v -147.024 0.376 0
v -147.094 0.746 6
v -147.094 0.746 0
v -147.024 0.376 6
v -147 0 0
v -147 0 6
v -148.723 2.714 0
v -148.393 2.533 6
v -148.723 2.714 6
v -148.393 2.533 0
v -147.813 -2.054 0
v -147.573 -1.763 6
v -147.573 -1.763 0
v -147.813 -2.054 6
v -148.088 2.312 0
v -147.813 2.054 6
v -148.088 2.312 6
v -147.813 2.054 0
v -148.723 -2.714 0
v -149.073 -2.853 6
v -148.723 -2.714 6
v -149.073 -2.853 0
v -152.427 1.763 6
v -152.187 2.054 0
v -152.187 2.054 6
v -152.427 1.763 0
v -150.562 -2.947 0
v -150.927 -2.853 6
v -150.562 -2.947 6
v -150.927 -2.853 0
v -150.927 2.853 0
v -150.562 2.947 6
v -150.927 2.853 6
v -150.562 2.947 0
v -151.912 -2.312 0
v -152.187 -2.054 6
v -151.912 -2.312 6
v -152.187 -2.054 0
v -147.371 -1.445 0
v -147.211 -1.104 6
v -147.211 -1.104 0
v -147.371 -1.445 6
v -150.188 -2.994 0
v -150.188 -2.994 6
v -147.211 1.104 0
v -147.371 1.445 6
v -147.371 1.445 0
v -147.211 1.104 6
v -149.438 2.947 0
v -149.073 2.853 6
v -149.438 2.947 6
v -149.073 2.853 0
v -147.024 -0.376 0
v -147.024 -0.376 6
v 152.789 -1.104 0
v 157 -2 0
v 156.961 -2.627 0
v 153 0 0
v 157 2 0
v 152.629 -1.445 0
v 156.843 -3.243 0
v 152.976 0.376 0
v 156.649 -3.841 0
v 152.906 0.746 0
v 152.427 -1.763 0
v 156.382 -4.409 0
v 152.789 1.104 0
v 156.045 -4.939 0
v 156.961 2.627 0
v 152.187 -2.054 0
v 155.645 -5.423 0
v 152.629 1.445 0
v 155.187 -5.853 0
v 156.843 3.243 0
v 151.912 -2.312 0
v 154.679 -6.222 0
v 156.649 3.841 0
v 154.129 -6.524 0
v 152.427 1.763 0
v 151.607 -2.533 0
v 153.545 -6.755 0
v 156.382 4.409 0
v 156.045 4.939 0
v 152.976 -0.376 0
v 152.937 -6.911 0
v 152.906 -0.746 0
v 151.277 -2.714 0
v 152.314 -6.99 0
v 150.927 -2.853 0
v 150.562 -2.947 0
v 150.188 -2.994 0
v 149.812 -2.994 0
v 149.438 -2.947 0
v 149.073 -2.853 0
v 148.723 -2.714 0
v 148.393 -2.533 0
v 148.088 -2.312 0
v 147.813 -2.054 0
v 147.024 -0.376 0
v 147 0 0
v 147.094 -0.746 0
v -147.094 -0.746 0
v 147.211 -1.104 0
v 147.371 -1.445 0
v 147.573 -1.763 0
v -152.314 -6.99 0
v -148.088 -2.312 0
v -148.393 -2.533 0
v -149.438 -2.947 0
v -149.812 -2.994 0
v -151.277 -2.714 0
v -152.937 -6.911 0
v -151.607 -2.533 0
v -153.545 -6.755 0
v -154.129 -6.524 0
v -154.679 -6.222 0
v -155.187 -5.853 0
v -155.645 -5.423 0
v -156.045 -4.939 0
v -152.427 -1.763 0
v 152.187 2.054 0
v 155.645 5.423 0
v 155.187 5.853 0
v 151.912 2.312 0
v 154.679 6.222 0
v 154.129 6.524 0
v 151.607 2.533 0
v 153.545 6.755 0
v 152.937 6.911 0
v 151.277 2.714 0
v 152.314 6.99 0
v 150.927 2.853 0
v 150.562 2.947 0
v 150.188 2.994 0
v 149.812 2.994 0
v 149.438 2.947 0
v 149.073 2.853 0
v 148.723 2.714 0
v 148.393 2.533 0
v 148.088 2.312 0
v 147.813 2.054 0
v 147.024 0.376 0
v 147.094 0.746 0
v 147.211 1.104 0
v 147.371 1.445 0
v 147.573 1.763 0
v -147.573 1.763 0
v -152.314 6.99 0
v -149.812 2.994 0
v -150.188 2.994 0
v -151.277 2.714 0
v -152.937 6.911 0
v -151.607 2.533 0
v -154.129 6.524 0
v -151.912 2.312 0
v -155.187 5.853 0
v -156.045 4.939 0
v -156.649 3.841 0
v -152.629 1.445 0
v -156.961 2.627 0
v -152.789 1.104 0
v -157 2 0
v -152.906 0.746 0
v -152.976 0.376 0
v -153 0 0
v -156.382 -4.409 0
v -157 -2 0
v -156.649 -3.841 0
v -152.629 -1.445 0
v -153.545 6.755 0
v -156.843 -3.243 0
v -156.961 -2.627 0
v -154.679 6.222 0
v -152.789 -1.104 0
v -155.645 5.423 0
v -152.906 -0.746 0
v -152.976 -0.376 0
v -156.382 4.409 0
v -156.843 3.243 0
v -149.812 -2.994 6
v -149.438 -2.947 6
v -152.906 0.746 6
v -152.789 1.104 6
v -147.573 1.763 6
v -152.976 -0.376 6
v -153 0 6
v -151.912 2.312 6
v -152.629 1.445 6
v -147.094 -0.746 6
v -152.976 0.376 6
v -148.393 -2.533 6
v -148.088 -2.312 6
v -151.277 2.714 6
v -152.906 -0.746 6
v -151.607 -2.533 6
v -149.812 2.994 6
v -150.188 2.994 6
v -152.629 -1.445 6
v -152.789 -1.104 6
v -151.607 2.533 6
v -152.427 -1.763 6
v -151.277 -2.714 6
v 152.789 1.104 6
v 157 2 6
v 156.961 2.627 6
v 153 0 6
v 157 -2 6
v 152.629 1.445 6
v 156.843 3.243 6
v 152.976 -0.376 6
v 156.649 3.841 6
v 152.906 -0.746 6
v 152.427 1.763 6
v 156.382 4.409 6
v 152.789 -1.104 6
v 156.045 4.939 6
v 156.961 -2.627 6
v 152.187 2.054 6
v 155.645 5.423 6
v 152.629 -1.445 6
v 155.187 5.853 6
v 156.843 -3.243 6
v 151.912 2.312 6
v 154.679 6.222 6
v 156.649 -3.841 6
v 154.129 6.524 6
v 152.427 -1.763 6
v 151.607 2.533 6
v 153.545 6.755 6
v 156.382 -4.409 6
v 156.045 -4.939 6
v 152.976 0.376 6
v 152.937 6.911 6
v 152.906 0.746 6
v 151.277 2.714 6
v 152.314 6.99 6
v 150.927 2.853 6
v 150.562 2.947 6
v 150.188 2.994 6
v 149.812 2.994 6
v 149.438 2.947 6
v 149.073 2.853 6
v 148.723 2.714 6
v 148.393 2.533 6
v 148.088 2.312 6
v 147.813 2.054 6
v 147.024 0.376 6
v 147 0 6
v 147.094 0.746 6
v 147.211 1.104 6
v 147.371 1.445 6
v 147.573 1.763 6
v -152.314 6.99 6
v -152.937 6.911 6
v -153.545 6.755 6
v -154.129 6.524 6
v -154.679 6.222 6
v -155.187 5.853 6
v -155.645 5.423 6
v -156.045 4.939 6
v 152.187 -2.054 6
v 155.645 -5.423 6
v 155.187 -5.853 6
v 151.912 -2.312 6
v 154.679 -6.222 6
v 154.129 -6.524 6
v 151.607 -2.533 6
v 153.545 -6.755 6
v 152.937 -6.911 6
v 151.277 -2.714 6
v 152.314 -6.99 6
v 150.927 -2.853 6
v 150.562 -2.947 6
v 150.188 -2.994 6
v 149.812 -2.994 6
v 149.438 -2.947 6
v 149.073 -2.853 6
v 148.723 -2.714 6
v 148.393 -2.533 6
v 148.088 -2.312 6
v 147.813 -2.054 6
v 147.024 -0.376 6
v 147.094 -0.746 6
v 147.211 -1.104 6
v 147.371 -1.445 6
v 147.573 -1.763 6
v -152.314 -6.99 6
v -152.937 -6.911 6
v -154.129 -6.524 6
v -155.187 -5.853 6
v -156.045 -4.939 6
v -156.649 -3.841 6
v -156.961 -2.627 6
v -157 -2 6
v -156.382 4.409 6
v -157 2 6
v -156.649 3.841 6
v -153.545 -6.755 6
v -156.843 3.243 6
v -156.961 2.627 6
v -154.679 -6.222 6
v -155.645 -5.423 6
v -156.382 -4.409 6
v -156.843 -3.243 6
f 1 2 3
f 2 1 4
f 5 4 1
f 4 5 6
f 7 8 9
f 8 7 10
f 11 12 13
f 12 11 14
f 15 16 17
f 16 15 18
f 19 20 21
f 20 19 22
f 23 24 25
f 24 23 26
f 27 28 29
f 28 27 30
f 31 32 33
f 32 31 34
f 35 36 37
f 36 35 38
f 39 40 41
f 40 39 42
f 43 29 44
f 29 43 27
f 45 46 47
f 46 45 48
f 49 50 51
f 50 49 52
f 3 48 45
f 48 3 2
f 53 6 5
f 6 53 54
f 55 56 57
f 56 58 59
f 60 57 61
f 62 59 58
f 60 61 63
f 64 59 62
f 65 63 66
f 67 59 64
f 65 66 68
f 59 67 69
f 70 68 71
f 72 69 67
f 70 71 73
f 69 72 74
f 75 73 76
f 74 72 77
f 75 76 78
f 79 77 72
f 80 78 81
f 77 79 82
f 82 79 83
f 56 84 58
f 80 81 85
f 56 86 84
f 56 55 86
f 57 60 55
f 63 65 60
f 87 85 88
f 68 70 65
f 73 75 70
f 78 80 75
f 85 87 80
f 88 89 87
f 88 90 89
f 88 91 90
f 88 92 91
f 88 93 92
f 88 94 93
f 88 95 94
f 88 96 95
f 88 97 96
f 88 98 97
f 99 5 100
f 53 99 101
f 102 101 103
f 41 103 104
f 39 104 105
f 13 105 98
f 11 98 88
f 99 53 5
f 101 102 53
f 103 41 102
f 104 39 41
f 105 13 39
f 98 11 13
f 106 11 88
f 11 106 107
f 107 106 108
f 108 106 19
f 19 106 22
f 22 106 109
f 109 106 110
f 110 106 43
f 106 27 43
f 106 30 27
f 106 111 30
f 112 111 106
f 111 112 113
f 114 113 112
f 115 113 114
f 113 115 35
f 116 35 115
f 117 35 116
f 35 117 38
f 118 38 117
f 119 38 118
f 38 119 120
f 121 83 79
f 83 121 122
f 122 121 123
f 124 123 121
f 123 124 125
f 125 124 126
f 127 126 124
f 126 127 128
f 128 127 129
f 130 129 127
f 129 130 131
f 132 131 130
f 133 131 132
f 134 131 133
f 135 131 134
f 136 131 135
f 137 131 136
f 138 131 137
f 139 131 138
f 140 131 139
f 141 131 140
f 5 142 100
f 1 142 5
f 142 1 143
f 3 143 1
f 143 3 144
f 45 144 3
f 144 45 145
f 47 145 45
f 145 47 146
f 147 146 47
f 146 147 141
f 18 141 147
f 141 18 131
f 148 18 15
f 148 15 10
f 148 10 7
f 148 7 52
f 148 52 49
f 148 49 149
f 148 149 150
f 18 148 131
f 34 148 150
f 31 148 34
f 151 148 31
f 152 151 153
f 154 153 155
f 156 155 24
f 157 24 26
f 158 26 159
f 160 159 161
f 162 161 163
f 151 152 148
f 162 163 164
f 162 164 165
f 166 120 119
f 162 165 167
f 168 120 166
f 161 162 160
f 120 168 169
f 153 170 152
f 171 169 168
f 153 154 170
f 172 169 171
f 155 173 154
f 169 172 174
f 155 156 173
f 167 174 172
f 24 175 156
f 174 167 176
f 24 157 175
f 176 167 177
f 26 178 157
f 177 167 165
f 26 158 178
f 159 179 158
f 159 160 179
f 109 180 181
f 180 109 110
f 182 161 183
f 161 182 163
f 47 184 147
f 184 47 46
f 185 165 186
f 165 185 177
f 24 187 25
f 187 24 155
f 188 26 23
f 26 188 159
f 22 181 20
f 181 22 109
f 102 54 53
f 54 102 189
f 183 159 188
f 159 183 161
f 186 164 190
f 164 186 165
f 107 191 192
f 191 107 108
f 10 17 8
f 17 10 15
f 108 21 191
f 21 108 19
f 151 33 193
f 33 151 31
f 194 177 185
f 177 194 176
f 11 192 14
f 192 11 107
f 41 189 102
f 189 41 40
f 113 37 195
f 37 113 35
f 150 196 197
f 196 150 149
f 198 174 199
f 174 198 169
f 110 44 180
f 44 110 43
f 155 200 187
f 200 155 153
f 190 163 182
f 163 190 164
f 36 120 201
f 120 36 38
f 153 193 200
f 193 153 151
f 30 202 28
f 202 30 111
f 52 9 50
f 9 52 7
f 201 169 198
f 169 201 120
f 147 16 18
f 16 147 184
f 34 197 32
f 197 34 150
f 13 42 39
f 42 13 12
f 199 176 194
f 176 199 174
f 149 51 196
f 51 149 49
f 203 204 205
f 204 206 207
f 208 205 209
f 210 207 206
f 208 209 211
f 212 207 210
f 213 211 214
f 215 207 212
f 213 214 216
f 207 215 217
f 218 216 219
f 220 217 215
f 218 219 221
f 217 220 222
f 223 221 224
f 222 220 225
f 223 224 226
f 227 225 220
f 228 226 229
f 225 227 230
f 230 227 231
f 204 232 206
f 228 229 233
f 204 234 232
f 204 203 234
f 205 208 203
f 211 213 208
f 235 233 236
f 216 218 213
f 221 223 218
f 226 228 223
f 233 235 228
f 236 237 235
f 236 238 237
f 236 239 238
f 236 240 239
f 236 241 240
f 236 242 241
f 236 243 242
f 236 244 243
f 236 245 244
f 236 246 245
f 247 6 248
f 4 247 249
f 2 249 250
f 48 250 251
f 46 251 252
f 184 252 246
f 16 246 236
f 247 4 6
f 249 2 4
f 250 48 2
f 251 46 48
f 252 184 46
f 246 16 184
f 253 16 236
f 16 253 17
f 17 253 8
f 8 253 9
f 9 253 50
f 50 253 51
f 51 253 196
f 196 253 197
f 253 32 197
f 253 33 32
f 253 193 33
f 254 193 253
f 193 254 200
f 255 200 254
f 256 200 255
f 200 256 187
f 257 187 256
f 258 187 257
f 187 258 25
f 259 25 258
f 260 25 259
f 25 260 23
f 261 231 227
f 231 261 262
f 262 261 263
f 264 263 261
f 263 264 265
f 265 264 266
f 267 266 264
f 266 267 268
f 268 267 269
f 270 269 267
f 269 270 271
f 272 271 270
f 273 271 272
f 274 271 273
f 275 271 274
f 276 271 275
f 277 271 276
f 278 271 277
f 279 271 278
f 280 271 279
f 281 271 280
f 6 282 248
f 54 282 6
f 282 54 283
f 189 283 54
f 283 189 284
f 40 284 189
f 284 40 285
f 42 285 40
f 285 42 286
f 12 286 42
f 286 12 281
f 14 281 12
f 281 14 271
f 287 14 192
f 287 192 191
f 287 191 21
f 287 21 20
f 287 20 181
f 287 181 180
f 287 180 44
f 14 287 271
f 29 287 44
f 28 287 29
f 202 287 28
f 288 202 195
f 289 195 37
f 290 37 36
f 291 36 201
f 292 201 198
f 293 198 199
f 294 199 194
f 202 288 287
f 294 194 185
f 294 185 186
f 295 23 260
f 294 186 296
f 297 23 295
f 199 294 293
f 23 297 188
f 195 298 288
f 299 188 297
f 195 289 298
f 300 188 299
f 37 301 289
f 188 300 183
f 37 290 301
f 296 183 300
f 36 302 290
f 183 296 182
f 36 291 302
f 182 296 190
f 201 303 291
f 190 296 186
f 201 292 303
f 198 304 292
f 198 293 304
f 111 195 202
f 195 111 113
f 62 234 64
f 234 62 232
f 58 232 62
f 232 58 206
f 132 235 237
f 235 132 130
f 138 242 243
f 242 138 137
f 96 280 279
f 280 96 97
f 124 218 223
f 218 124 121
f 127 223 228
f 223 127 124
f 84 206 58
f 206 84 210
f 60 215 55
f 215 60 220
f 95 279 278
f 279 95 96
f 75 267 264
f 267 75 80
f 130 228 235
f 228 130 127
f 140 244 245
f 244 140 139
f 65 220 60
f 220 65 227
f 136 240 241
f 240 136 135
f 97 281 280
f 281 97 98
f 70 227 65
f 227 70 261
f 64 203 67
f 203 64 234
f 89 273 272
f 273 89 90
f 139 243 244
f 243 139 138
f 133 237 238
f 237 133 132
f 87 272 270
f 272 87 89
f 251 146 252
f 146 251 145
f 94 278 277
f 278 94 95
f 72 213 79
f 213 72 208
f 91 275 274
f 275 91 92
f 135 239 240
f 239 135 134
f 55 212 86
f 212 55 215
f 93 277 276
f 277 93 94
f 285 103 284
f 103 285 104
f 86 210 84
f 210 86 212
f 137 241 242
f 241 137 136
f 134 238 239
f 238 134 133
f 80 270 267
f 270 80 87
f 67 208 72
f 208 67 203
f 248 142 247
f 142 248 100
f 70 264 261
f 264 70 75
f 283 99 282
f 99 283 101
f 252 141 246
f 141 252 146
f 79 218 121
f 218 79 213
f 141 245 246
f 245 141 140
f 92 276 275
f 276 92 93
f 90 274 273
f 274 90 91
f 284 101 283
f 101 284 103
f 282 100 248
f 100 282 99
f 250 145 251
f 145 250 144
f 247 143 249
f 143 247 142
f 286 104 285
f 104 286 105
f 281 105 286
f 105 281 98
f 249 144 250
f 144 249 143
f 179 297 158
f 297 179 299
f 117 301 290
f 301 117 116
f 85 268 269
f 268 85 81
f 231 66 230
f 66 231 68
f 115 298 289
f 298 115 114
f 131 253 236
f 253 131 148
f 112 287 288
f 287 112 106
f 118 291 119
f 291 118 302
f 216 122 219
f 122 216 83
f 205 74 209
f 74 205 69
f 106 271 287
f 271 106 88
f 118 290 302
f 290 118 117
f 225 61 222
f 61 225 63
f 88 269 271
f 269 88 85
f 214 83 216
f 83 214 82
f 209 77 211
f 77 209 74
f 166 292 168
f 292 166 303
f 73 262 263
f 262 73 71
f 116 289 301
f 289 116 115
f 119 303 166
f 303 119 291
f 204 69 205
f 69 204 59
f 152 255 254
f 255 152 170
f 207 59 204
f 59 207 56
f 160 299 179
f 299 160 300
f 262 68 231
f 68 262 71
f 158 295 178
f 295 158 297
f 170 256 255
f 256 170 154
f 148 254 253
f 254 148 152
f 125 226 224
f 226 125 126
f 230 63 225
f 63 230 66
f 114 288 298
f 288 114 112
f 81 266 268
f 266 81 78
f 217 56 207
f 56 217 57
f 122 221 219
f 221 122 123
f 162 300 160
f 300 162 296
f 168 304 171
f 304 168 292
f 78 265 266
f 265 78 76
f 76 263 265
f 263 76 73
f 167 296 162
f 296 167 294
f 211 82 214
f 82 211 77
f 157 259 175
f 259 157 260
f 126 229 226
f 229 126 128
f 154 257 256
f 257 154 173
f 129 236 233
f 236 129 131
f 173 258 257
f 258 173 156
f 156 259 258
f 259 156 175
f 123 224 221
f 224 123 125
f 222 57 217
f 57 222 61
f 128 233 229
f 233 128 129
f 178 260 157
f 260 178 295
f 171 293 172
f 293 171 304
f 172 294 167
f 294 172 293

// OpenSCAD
$fn = 50;


difference() {
	union() {
		hull() {
			translate(v = [-152.0000000000, 2.0000000000, 0]) {
				cylinder(h = 6, r = 5);
			}
			translate(v = [152.0000000000, 2.0000000000, 0]) {
				cylinder(h = 6, r = 5);
			}
			translate(v = [-152.0000000000, -2.0000000000, 0]) {
				cylinder(h = 6, r = 5);
			}
			translate(v = [152.0000000000, -2.0000000000, 0]) {
				cylinder(h = 6, r = 5);
			}
		}
	}
	union() {
		translate(v = [-150.0000000000, 0.0000000000, 0]) {
			cylinder(h = 6, r = 3.0000000000);
		}
		translate(v = [150.0000000000, 0.0000000000, 0]) {
			cylinder(h = 6, r = 3.0000000000);
		}
		translate(v = [-150.0000000000, 0.0000000000, 0]) {
			cylinder(h = 6, r = 1.5000000000);
		}
		translate(v = [150.0000000000, 0.0000000000, 0]) {
			cylinder(h = 6, r = 1.5000000000);
		}
		translate(v = [-150.0000000000, 0.0000000000, 0]) {
			cylinder(h = 6, r = 1.5000000000);
		}
		translate(v = [150.0000000000, 0.0000000000, 0]) {
			cylinder(h = 6, r = 1.5000000000);
		}
		translate(v = [-150.0000000000, 0.0000000000, 0]) {
			cylinder(h = 6, r = 1.5000000000);
		}
		translate(v = [150.0000000000, 0.0000000000, 0]) {
			cylinder(h = 6, r = 1.5000000000);
		}
	}
}
